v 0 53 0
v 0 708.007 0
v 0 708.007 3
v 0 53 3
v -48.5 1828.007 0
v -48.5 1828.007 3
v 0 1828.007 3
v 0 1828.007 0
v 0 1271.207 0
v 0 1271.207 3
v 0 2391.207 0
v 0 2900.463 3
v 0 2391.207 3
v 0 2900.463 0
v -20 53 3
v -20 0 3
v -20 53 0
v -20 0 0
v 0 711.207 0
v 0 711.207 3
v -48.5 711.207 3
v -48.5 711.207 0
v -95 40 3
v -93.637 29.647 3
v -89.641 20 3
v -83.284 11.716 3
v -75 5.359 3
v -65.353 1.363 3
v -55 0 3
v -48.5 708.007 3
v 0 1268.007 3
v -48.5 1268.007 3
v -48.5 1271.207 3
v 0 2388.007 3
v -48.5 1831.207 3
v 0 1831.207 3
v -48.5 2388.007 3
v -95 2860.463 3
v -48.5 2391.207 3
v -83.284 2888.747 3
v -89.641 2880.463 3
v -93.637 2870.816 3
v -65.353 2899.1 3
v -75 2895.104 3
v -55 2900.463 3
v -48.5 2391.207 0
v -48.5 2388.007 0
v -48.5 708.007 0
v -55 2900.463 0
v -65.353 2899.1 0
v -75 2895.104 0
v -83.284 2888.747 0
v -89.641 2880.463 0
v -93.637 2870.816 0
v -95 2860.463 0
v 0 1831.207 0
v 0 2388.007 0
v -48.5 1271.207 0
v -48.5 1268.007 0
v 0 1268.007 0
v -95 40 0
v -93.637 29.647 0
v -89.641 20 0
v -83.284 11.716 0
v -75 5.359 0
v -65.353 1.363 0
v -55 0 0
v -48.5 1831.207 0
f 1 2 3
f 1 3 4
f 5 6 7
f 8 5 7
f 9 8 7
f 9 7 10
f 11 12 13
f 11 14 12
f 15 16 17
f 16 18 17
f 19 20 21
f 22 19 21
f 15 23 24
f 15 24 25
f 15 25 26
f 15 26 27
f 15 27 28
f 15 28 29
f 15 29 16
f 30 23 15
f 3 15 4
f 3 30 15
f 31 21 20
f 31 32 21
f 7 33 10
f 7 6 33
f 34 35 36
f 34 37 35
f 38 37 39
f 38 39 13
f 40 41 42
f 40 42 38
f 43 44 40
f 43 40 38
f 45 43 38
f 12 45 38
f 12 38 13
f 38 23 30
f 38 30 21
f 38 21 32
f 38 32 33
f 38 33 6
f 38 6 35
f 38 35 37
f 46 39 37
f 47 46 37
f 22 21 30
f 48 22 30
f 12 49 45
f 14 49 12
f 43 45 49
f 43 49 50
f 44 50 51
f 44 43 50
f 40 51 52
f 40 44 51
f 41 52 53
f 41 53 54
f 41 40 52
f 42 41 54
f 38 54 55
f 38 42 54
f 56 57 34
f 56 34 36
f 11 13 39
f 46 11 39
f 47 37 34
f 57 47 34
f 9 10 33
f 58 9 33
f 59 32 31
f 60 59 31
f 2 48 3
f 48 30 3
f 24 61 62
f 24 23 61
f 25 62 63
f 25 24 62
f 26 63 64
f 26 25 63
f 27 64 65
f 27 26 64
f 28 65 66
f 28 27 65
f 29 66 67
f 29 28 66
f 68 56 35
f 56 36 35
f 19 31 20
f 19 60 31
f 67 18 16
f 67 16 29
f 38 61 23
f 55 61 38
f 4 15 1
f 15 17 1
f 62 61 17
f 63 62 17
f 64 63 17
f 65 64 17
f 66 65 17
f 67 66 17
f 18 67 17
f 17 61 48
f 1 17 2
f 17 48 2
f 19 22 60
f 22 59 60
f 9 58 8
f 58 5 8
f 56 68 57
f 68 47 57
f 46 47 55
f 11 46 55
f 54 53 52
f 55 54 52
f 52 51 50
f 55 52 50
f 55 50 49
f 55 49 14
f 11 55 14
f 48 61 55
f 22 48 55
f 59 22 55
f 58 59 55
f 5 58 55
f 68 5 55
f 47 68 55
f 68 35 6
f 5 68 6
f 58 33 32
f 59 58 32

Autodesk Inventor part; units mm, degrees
ref_plane "YZ Plane" through (0, 0, 0) normal (1, 0, 0) x (0, 1, 0)
ref_plane "XZ Plane" through (0, 0, 0) normal (0, 1, 0) x (-1, 0, 0)
ref_plane "XY Plane" through (0, 0, 0) normal (0, 0, 1) x (1, 0, 0)
sketch "Sketch1" plane through (0, 0, 0) normal (0, 0, 1) x (1, 0, 0)
  line L0 (-95, 2900.463) -> (0, 2900.463)
  line L1 (0, 2900.463) -> (0, 0)
  line L2 (0, 0) -> (-95, 0)
  line L3 (-95, 0) -> (-95, 2900.463)
  line L4 (-20, 53) -> (0, 53)
  line L5 (0, 53) -> (0, 0)
  line L6 (0, 0) -> (-20, 0)
  line L7 (-20, 0) -> (-20, 53)
  dimension "d0" = 95
  dimension "d1" = 2900.463
  dimension "d10" = 20
  dimension "d11" = 53
extrude "Plate1" add sketch "Sketch1" along normal blind 3 contours L0 L1 L4 L7 L2 L3
sketch "Sketch2" plane through (0, 0, 3) normal (0, 0, 1) x (1, 0, 0)
  line L0 (0, 0) -> (0, 2900.463) projected
  line L1 (0, 2391.207) -> (-48.5, 2391.207)
  line L2 (-48.5, 2391.207) -> (-48.5, 2388.007)
  line L3 (-48.5, 2388.007) -> (0, 2388.007)
  line L4 (0, 2388.007) -> (0, 2391.207)
  point P0 (0, 2388.007)
  dimension "d3" = 509.256
  dimension "d4" = 3.2
  dimension "d5" = 48.5
extrude "Extrusion1" cut sketch "Sketch2" against normal through all
pattern_linear "Rectangular Pattern1" count 4 spacing 560 along (0, -1, 0) of "Extrusion1"
fillet "Corner Round1" radius 40 2 edges at (-95, 2900.463, 1.5) (-95, 0, 1.5)
equation "\"d2\" = Thickness"
equation "\"BendReliefWidth\" = Thickness"
equation "\"BendReliefDepth\" = 0.5 * Thickness"
equation "\"CornerReliefSize\" = 4 * Thickness"
equation "\"MinimumRemnant\" = 2 * Thickness"
equation "\"TransitionRadius\" = BendRadius"
equation "\"JacobiRadiusSize\" = BendRadius"
equation "\"GapSize\" = Thickness"
equation "\"Thickness\" = 3"
equation "\"BendRadius\" = 5"
properties part number "BSH 023 rib butt end" material "Steel"
